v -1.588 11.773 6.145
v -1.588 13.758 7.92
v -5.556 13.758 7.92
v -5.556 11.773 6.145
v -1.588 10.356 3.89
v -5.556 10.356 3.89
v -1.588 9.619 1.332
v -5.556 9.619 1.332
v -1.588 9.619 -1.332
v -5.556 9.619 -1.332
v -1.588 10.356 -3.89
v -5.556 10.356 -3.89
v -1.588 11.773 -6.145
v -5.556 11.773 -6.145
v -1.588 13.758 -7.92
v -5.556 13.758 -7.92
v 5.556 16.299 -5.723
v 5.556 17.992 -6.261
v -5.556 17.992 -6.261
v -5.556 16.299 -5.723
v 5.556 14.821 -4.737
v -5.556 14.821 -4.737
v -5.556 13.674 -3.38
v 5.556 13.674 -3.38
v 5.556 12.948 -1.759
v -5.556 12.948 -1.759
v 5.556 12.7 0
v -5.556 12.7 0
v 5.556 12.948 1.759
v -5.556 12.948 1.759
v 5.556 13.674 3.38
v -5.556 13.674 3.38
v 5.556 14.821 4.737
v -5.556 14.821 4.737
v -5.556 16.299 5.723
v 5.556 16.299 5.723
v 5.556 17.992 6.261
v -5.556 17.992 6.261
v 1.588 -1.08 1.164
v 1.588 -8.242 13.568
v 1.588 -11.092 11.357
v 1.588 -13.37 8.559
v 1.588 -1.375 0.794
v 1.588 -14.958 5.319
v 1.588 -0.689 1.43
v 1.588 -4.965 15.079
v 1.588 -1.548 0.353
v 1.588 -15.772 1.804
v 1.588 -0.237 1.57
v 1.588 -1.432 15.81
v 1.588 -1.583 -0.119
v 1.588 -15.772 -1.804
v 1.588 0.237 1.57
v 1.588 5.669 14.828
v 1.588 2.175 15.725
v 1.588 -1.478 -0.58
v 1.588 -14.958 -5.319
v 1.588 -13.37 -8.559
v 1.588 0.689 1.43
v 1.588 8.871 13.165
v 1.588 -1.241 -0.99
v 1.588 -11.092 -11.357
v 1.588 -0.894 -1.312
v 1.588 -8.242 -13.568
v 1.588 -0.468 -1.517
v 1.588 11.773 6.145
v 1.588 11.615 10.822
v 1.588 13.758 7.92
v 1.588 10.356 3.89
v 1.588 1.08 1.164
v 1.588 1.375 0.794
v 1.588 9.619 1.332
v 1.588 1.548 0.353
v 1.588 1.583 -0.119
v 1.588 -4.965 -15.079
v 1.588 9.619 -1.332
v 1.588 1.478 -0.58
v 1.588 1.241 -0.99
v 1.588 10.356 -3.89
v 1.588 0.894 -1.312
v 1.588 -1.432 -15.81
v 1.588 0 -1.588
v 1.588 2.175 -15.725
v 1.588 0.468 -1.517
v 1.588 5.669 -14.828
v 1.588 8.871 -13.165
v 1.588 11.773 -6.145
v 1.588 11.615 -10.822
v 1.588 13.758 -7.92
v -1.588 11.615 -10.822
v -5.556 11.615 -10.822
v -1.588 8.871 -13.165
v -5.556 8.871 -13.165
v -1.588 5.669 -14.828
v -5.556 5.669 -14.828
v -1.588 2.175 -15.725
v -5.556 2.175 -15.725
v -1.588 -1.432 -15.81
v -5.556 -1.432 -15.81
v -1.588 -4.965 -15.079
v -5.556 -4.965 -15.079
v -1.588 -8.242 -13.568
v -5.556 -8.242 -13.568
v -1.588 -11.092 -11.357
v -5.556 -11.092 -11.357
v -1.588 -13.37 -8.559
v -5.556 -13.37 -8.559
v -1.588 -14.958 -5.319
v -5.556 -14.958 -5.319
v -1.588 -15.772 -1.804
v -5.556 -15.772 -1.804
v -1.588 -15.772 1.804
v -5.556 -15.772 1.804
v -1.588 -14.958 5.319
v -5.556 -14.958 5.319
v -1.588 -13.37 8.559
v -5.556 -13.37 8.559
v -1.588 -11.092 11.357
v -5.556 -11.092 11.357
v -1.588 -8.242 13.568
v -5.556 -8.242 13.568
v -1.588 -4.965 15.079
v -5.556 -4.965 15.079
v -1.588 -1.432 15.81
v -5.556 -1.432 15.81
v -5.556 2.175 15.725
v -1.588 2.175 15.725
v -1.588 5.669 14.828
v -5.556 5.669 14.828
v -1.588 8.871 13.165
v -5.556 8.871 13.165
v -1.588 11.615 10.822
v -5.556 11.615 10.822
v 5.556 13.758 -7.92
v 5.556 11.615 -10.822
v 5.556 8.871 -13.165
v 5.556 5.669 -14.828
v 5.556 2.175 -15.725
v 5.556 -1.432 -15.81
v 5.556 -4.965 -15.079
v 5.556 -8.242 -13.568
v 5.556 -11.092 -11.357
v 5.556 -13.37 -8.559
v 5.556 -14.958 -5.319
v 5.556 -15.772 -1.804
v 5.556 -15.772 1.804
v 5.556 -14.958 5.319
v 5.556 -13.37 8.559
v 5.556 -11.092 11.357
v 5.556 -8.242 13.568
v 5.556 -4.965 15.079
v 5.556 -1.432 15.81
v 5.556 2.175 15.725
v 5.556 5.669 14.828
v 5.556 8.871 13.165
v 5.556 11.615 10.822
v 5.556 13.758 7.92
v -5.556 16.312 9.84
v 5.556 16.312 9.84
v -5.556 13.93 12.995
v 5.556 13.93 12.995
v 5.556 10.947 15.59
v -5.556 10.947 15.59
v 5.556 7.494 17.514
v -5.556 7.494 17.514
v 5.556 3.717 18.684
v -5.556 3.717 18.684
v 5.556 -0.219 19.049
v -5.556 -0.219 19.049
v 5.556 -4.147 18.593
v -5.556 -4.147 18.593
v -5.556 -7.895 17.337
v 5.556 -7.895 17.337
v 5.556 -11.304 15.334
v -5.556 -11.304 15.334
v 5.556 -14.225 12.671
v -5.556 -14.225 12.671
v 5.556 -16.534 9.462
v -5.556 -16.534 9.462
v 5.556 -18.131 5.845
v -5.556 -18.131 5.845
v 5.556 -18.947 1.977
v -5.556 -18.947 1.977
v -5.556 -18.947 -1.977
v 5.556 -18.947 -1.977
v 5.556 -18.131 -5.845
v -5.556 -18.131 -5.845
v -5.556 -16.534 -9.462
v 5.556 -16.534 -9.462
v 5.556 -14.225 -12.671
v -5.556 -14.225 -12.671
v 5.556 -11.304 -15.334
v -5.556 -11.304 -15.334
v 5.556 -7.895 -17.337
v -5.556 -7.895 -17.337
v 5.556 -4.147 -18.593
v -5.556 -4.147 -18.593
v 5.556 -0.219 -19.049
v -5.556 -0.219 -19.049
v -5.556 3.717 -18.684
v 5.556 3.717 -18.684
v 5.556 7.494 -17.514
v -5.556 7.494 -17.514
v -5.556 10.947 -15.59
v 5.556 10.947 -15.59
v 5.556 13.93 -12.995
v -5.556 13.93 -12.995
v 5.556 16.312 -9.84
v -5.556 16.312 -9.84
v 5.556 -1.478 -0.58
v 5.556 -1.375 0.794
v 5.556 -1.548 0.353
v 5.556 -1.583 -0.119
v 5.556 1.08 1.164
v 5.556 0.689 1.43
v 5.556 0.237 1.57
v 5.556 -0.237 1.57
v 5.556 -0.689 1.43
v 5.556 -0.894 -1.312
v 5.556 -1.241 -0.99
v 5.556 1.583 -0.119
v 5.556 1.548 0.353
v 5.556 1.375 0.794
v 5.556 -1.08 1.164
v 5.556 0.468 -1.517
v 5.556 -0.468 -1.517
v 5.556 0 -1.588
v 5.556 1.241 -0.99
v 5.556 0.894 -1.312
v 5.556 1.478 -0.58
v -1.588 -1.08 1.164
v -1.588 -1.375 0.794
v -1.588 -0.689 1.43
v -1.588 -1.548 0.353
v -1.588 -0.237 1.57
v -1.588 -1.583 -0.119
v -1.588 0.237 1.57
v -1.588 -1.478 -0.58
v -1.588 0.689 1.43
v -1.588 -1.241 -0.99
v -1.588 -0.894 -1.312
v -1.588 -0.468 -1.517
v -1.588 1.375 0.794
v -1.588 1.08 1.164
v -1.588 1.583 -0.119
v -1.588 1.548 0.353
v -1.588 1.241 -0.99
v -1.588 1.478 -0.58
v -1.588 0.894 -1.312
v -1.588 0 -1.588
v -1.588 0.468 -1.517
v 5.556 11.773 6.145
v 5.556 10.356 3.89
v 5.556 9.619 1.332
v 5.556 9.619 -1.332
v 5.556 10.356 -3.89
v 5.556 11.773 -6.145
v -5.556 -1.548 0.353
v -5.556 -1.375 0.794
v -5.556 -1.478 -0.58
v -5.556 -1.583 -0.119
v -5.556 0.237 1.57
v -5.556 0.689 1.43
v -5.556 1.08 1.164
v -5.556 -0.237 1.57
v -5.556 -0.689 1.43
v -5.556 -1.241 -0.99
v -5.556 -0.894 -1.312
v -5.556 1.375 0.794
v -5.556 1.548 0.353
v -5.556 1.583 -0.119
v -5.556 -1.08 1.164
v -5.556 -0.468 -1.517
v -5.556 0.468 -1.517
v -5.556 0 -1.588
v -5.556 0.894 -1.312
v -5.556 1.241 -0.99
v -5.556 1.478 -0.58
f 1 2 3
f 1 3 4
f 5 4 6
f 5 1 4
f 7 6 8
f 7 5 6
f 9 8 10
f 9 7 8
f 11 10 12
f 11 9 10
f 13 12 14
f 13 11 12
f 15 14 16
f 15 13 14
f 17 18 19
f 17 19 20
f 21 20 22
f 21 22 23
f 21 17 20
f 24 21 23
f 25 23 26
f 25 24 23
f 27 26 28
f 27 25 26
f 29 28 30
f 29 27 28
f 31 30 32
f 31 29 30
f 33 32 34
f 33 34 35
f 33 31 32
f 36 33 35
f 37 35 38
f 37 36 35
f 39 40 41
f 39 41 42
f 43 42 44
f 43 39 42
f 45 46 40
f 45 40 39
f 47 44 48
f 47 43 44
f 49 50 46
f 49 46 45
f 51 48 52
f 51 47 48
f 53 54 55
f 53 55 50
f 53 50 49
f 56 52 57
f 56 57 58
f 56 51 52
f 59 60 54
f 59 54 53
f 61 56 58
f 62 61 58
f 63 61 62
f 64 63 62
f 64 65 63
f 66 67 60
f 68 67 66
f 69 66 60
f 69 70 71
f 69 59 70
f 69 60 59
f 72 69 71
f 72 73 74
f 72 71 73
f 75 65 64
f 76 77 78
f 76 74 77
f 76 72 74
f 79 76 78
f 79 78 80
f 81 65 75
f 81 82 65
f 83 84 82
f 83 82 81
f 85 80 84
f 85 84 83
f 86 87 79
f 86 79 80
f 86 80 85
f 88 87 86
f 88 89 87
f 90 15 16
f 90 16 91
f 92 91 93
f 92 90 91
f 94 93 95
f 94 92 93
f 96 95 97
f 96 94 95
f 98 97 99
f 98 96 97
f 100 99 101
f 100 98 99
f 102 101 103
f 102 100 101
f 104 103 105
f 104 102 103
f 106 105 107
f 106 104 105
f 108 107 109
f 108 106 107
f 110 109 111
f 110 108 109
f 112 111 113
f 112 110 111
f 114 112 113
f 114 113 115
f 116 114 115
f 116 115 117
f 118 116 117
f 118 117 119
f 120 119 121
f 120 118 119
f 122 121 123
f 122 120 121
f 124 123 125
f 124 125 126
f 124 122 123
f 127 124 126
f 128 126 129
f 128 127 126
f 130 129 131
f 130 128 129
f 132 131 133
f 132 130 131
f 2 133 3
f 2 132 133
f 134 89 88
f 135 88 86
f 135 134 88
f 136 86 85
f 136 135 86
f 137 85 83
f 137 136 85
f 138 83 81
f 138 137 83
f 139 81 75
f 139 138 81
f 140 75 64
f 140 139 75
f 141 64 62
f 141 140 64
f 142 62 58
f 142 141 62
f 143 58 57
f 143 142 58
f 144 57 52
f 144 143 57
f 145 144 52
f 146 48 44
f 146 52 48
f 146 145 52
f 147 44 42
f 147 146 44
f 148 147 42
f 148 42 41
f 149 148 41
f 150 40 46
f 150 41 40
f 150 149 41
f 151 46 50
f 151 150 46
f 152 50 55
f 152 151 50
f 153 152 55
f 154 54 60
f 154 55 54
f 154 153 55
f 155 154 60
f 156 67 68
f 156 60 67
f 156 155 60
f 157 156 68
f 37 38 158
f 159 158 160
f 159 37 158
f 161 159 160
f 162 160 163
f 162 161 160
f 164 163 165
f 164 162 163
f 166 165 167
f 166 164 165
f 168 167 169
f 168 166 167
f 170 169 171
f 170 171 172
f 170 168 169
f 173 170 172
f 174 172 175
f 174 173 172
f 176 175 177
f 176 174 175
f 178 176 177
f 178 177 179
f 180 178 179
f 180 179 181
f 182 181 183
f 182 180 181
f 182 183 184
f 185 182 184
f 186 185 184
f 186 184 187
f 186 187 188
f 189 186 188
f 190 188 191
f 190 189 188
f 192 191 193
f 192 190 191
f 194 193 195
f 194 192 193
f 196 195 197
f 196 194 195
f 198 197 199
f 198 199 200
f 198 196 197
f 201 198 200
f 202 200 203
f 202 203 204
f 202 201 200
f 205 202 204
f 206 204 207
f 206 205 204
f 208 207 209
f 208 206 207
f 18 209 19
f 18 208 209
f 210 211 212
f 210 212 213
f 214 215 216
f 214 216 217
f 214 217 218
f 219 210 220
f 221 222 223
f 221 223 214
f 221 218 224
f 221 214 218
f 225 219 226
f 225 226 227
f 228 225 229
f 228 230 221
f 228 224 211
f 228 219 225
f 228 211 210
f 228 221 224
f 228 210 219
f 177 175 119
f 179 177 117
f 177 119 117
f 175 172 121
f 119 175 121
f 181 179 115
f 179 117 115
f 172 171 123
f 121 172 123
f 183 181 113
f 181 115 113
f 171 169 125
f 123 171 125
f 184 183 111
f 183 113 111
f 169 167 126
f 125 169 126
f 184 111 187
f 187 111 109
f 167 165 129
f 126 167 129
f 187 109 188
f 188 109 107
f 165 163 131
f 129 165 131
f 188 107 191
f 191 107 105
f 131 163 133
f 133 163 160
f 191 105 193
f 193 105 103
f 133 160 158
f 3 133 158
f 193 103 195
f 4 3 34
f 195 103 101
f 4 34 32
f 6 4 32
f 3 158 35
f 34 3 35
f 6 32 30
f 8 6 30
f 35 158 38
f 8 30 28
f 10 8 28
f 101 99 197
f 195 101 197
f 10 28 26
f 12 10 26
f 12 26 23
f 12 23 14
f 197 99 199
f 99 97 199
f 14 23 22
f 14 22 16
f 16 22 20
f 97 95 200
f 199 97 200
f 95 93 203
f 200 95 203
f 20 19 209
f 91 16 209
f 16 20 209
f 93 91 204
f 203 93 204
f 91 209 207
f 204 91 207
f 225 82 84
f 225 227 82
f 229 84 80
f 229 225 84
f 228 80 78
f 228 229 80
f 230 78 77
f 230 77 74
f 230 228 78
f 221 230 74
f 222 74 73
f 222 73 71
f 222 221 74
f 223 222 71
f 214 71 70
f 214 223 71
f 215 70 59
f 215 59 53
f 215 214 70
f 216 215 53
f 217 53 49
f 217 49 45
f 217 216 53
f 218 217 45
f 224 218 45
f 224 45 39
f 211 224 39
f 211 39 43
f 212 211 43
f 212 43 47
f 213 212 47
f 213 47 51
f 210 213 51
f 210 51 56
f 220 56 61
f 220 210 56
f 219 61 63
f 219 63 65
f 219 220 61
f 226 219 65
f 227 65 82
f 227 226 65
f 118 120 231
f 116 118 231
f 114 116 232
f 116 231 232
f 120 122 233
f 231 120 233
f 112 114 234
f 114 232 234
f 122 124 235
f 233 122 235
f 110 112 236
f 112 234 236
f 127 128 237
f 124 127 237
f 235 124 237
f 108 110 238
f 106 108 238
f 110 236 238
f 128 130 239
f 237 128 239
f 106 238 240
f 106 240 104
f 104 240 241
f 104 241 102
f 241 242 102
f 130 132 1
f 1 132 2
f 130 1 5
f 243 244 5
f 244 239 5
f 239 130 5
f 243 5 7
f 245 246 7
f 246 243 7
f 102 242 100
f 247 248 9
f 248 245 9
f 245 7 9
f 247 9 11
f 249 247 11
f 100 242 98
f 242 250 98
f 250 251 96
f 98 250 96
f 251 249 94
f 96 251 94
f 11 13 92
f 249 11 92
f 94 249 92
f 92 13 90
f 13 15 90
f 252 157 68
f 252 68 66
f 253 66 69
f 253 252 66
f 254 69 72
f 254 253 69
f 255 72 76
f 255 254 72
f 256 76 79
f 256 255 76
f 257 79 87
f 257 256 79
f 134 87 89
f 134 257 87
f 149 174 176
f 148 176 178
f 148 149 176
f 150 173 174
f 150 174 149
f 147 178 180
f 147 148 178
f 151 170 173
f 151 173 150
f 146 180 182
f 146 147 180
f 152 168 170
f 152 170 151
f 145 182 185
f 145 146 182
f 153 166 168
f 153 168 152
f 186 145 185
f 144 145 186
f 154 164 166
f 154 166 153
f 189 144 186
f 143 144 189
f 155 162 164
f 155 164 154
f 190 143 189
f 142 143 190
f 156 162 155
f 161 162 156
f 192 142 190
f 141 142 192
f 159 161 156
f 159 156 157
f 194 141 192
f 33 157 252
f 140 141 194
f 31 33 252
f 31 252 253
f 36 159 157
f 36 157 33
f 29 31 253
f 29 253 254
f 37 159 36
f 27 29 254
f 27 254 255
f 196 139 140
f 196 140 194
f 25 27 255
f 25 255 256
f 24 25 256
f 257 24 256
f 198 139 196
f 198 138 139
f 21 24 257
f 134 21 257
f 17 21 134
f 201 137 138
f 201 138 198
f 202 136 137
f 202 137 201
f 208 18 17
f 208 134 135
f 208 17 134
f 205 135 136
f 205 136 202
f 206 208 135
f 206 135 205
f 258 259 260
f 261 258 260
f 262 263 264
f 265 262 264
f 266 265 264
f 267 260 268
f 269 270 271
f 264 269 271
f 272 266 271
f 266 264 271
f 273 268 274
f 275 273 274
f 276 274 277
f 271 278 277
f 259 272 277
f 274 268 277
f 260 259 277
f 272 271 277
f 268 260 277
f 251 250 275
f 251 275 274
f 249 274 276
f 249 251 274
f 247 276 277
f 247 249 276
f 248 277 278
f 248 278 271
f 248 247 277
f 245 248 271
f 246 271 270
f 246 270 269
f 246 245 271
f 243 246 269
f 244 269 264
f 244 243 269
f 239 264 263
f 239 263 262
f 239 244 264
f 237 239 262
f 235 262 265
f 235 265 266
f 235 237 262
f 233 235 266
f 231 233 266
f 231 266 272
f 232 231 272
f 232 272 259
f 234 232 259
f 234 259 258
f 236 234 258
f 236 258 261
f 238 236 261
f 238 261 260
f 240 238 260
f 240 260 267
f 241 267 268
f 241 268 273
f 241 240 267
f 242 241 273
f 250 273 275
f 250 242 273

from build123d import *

# Parameters (mm, degrees)
BOSS_EXTRUDE1_DEPTH = 5.55625
BOSS_EXTRUDE2_DEPTH = 1.5875
SKETCH6_R           = 1.5875
BOSS_EXTRUDE3_DEPTH = 5.55625


with BuildPart() as part:
    # Sketch1 → Boss-Extrude1 (new body, symmetric)
    with BuildSketch(Plane(origin=(0, 0, 0), x_dir=(0, 0, -1), z_dir=(1, 0, 0))):
        with BuildLine():
            ThreePointArc((-6.261184437, 17.991666667), (0, -19.05), (6.261184437, 17.991666667))
            ThreePointArc((6.261184437, 17.991666667), (0, 12.7), (-6.261184437, 17.991666667))
        make_face()
        with BuildLine():
            ThreePointArc((-7.919841469, 13.758333333), (0, 9.525), (7.919841469, 13.758333333))
            ThreePointArc((7.919841469, 13.758333333), (0, -15.875), (-7.919841469, 13.758333333))
        make_face(mode=Mode.SUBTRACT)
    extrude(amount=BOSS_EXTRUDE1_DEPTH, both=True)

    # Sketch3 → Boss-Extrude2 (add, symmetric)
    with BuildSketch(Plane(origin=(0, 0, 0), x_dir=(0, 0, -1), z_dir=(1, 0, 0))):
        with BuildLine():
            ThreePointArc((-7.919841469, 13.758333333), (0, -15.875), (7.919841469, 13.758333333))
            ThreePointArc((7.919841469, 13.758333333), (0, 9.525), (-7.919841469, 13.758333333))
        make_face()
    extrude(amount=BOSS_EXTRUDE2_DEPTH, both=True)

    # Sketch6 → Boss-Extrude3 (add, symmetric)
    with BuildSketch(Plane(origin=(0, 0, 0), x_dir=(0, 0, -1), z_dir=(1, 0, 0))):
        Circle(SKETCH6_R)
    extrude(amount=BOSS_EXTRUDE3_DEPTH, both=True)


solid = part.part
